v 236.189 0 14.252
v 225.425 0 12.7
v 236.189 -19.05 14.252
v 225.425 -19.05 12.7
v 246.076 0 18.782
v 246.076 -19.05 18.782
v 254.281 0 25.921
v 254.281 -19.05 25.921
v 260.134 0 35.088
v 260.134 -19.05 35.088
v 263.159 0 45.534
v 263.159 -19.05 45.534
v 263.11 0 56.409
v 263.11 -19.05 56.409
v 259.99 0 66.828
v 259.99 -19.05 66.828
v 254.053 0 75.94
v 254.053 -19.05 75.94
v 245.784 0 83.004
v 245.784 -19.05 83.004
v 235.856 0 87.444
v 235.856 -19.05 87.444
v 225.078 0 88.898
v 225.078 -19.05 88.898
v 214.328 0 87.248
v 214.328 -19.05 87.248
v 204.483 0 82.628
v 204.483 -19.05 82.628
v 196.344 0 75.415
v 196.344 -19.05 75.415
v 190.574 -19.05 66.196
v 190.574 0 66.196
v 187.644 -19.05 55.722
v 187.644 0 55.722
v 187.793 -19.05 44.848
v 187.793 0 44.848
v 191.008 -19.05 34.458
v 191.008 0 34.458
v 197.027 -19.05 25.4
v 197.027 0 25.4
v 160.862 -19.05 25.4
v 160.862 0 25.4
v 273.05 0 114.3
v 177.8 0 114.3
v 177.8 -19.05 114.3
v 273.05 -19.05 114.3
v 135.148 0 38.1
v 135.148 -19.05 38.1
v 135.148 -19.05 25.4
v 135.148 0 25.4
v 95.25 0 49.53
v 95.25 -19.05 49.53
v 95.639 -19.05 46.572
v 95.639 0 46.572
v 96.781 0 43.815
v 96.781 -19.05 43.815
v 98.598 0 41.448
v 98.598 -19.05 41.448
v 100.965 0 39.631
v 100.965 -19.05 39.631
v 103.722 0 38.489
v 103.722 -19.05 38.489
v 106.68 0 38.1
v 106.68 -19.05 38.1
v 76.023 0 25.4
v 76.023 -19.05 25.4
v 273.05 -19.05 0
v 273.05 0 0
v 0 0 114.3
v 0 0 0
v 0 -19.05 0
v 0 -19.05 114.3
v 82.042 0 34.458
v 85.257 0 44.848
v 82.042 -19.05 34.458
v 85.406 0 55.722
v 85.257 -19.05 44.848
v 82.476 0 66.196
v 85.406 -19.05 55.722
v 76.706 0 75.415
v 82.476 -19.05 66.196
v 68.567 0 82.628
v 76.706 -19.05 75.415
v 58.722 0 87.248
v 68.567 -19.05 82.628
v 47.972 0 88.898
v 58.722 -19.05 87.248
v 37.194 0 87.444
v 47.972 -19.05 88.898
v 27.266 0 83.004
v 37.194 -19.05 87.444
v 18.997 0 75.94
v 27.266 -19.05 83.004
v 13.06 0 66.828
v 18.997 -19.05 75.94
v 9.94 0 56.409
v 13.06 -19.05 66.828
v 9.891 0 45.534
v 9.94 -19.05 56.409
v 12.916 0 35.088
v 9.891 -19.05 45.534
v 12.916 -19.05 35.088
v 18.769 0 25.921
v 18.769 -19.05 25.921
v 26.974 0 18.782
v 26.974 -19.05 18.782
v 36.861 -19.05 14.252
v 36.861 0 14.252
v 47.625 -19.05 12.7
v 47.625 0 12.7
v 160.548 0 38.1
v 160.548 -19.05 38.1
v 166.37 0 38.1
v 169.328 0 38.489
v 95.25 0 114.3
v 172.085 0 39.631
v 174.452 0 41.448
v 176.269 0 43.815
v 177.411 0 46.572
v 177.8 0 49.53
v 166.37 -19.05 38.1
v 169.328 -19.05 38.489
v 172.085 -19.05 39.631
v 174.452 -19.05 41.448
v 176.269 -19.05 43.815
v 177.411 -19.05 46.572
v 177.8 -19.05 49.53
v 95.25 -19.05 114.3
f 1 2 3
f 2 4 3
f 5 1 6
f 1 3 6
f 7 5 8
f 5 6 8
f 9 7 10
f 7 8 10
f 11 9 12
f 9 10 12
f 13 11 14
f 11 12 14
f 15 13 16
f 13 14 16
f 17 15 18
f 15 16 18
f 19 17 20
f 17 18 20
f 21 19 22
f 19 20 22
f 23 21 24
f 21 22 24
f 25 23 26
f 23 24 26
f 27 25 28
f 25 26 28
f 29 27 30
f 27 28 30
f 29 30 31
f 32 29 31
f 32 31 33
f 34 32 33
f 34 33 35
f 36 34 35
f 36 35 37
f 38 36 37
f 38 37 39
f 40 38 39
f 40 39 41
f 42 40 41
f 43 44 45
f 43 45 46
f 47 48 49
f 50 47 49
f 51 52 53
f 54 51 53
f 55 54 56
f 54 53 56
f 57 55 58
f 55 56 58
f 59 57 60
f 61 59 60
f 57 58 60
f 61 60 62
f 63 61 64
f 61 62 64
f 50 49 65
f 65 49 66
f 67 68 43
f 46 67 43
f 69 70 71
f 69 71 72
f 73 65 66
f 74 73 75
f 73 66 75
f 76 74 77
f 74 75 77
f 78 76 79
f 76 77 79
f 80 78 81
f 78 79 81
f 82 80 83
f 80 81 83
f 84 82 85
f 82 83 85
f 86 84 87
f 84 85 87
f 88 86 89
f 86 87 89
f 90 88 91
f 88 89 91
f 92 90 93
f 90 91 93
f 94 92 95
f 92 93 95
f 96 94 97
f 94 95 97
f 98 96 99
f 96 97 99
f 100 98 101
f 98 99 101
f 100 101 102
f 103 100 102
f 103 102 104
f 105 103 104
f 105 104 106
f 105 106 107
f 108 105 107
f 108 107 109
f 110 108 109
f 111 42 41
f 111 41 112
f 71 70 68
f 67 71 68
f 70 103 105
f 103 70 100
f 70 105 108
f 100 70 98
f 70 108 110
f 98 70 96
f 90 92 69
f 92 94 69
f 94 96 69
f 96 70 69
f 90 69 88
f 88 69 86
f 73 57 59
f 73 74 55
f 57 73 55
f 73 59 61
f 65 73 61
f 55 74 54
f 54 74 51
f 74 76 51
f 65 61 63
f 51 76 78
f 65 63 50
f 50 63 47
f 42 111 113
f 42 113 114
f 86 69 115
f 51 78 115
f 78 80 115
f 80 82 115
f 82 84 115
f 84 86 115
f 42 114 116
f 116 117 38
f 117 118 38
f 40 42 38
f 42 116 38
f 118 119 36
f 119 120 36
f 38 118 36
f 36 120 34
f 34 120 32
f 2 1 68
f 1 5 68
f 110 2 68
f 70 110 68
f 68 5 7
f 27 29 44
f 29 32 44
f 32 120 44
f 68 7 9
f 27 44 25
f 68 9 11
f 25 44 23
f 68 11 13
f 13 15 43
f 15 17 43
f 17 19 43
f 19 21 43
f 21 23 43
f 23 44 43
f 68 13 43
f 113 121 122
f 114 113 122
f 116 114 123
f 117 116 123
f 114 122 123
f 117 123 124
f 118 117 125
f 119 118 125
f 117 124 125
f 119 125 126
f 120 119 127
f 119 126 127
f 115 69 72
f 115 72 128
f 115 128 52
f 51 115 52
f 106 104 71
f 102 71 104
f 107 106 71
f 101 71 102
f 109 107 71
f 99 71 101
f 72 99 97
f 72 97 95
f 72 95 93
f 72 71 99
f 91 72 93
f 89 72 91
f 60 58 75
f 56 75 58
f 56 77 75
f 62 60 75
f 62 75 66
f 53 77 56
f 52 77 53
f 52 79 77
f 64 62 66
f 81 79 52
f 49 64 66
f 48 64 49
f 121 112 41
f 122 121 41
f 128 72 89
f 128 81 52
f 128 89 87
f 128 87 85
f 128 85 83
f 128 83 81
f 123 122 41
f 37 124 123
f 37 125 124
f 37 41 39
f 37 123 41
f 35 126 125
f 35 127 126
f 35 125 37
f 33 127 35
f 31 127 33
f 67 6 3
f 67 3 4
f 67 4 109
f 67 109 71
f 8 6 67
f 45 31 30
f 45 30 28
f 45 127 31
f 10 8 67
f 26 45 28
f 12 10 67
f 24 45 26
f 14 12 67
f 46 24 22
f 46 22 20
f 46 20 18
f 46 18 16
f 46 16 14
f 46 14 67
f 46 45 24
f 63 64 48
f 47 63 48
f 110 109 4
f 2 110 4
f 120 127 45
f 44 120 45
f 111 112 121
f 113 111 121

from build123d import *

# Parameters (mm, degrees)
F0_W     = 273.05
F0_H     = 114.3
F1_DEPTH = 19.05
F2_R     = 38.1
F3_DEPTH = 25.4
F5_DEPTH = 25.4
F7_DEPTH = 25.4


with BuildPart() as f1:
    # F0 (on Front) → F1 (new body)
    with BuildSketch(Plane.XZ):
        with Locations((136.525, 57.15)):
            Rectangle(F0_W, F0_H)
    extrude(amount=F1_DEPTH)

    # F2 (on face) → F3 (cut)
    with BuildSketch(Plane.XZ.offset(19.05)):
        with Locations((47.625, 50.8)):
            Circle(F2_R)
        with Locations((225.425, 50.8)):
            Circle(F2_R)
    extrude(amount=-F3_DEPTH, mode=Mode.SUBTRACT)

    # F4 (on face) → F5 (cut)
    with BuildSketch(Plane.XZ.offset(19.05)):
        with BuildLine():
            Line((177.8, 114.3), (95.25, 114.3))
            Line((95.25, 114.3), (95.25, 49.53))
            ThreePointArc((95.25, 49.53), (98.597769, 41.447769), (106.68, 38.1))
            Line((106.68, 38.1), (166.37, 38.1))
            ThreePointArc((166.37, 38.1), (174.452231, 41.447769), (177.8, 49.53))
            Line((177.8, 49.53), (177.8, 114.3))
        make_face()
    extrude(amount=-F5_DEPTH, mode=Mode.SUBTRACT)

    # F6 (on face) → F7 (cut)
    with BuildSketch(Plane.XZ.offset(19.05)):
        Polygon((160.862069, 25.4), (160.547867, 38.1), (135.147867, 38.1), (135.147867, 25.4), (76.023063, 25.4), (47.625, 12.7), (225.425, 12.7), (197.026937, 25.4), align=None)
    extrude(amount=-F7_DEPTH, mode=Mode.SUBTRACT)


solid = f1.part
